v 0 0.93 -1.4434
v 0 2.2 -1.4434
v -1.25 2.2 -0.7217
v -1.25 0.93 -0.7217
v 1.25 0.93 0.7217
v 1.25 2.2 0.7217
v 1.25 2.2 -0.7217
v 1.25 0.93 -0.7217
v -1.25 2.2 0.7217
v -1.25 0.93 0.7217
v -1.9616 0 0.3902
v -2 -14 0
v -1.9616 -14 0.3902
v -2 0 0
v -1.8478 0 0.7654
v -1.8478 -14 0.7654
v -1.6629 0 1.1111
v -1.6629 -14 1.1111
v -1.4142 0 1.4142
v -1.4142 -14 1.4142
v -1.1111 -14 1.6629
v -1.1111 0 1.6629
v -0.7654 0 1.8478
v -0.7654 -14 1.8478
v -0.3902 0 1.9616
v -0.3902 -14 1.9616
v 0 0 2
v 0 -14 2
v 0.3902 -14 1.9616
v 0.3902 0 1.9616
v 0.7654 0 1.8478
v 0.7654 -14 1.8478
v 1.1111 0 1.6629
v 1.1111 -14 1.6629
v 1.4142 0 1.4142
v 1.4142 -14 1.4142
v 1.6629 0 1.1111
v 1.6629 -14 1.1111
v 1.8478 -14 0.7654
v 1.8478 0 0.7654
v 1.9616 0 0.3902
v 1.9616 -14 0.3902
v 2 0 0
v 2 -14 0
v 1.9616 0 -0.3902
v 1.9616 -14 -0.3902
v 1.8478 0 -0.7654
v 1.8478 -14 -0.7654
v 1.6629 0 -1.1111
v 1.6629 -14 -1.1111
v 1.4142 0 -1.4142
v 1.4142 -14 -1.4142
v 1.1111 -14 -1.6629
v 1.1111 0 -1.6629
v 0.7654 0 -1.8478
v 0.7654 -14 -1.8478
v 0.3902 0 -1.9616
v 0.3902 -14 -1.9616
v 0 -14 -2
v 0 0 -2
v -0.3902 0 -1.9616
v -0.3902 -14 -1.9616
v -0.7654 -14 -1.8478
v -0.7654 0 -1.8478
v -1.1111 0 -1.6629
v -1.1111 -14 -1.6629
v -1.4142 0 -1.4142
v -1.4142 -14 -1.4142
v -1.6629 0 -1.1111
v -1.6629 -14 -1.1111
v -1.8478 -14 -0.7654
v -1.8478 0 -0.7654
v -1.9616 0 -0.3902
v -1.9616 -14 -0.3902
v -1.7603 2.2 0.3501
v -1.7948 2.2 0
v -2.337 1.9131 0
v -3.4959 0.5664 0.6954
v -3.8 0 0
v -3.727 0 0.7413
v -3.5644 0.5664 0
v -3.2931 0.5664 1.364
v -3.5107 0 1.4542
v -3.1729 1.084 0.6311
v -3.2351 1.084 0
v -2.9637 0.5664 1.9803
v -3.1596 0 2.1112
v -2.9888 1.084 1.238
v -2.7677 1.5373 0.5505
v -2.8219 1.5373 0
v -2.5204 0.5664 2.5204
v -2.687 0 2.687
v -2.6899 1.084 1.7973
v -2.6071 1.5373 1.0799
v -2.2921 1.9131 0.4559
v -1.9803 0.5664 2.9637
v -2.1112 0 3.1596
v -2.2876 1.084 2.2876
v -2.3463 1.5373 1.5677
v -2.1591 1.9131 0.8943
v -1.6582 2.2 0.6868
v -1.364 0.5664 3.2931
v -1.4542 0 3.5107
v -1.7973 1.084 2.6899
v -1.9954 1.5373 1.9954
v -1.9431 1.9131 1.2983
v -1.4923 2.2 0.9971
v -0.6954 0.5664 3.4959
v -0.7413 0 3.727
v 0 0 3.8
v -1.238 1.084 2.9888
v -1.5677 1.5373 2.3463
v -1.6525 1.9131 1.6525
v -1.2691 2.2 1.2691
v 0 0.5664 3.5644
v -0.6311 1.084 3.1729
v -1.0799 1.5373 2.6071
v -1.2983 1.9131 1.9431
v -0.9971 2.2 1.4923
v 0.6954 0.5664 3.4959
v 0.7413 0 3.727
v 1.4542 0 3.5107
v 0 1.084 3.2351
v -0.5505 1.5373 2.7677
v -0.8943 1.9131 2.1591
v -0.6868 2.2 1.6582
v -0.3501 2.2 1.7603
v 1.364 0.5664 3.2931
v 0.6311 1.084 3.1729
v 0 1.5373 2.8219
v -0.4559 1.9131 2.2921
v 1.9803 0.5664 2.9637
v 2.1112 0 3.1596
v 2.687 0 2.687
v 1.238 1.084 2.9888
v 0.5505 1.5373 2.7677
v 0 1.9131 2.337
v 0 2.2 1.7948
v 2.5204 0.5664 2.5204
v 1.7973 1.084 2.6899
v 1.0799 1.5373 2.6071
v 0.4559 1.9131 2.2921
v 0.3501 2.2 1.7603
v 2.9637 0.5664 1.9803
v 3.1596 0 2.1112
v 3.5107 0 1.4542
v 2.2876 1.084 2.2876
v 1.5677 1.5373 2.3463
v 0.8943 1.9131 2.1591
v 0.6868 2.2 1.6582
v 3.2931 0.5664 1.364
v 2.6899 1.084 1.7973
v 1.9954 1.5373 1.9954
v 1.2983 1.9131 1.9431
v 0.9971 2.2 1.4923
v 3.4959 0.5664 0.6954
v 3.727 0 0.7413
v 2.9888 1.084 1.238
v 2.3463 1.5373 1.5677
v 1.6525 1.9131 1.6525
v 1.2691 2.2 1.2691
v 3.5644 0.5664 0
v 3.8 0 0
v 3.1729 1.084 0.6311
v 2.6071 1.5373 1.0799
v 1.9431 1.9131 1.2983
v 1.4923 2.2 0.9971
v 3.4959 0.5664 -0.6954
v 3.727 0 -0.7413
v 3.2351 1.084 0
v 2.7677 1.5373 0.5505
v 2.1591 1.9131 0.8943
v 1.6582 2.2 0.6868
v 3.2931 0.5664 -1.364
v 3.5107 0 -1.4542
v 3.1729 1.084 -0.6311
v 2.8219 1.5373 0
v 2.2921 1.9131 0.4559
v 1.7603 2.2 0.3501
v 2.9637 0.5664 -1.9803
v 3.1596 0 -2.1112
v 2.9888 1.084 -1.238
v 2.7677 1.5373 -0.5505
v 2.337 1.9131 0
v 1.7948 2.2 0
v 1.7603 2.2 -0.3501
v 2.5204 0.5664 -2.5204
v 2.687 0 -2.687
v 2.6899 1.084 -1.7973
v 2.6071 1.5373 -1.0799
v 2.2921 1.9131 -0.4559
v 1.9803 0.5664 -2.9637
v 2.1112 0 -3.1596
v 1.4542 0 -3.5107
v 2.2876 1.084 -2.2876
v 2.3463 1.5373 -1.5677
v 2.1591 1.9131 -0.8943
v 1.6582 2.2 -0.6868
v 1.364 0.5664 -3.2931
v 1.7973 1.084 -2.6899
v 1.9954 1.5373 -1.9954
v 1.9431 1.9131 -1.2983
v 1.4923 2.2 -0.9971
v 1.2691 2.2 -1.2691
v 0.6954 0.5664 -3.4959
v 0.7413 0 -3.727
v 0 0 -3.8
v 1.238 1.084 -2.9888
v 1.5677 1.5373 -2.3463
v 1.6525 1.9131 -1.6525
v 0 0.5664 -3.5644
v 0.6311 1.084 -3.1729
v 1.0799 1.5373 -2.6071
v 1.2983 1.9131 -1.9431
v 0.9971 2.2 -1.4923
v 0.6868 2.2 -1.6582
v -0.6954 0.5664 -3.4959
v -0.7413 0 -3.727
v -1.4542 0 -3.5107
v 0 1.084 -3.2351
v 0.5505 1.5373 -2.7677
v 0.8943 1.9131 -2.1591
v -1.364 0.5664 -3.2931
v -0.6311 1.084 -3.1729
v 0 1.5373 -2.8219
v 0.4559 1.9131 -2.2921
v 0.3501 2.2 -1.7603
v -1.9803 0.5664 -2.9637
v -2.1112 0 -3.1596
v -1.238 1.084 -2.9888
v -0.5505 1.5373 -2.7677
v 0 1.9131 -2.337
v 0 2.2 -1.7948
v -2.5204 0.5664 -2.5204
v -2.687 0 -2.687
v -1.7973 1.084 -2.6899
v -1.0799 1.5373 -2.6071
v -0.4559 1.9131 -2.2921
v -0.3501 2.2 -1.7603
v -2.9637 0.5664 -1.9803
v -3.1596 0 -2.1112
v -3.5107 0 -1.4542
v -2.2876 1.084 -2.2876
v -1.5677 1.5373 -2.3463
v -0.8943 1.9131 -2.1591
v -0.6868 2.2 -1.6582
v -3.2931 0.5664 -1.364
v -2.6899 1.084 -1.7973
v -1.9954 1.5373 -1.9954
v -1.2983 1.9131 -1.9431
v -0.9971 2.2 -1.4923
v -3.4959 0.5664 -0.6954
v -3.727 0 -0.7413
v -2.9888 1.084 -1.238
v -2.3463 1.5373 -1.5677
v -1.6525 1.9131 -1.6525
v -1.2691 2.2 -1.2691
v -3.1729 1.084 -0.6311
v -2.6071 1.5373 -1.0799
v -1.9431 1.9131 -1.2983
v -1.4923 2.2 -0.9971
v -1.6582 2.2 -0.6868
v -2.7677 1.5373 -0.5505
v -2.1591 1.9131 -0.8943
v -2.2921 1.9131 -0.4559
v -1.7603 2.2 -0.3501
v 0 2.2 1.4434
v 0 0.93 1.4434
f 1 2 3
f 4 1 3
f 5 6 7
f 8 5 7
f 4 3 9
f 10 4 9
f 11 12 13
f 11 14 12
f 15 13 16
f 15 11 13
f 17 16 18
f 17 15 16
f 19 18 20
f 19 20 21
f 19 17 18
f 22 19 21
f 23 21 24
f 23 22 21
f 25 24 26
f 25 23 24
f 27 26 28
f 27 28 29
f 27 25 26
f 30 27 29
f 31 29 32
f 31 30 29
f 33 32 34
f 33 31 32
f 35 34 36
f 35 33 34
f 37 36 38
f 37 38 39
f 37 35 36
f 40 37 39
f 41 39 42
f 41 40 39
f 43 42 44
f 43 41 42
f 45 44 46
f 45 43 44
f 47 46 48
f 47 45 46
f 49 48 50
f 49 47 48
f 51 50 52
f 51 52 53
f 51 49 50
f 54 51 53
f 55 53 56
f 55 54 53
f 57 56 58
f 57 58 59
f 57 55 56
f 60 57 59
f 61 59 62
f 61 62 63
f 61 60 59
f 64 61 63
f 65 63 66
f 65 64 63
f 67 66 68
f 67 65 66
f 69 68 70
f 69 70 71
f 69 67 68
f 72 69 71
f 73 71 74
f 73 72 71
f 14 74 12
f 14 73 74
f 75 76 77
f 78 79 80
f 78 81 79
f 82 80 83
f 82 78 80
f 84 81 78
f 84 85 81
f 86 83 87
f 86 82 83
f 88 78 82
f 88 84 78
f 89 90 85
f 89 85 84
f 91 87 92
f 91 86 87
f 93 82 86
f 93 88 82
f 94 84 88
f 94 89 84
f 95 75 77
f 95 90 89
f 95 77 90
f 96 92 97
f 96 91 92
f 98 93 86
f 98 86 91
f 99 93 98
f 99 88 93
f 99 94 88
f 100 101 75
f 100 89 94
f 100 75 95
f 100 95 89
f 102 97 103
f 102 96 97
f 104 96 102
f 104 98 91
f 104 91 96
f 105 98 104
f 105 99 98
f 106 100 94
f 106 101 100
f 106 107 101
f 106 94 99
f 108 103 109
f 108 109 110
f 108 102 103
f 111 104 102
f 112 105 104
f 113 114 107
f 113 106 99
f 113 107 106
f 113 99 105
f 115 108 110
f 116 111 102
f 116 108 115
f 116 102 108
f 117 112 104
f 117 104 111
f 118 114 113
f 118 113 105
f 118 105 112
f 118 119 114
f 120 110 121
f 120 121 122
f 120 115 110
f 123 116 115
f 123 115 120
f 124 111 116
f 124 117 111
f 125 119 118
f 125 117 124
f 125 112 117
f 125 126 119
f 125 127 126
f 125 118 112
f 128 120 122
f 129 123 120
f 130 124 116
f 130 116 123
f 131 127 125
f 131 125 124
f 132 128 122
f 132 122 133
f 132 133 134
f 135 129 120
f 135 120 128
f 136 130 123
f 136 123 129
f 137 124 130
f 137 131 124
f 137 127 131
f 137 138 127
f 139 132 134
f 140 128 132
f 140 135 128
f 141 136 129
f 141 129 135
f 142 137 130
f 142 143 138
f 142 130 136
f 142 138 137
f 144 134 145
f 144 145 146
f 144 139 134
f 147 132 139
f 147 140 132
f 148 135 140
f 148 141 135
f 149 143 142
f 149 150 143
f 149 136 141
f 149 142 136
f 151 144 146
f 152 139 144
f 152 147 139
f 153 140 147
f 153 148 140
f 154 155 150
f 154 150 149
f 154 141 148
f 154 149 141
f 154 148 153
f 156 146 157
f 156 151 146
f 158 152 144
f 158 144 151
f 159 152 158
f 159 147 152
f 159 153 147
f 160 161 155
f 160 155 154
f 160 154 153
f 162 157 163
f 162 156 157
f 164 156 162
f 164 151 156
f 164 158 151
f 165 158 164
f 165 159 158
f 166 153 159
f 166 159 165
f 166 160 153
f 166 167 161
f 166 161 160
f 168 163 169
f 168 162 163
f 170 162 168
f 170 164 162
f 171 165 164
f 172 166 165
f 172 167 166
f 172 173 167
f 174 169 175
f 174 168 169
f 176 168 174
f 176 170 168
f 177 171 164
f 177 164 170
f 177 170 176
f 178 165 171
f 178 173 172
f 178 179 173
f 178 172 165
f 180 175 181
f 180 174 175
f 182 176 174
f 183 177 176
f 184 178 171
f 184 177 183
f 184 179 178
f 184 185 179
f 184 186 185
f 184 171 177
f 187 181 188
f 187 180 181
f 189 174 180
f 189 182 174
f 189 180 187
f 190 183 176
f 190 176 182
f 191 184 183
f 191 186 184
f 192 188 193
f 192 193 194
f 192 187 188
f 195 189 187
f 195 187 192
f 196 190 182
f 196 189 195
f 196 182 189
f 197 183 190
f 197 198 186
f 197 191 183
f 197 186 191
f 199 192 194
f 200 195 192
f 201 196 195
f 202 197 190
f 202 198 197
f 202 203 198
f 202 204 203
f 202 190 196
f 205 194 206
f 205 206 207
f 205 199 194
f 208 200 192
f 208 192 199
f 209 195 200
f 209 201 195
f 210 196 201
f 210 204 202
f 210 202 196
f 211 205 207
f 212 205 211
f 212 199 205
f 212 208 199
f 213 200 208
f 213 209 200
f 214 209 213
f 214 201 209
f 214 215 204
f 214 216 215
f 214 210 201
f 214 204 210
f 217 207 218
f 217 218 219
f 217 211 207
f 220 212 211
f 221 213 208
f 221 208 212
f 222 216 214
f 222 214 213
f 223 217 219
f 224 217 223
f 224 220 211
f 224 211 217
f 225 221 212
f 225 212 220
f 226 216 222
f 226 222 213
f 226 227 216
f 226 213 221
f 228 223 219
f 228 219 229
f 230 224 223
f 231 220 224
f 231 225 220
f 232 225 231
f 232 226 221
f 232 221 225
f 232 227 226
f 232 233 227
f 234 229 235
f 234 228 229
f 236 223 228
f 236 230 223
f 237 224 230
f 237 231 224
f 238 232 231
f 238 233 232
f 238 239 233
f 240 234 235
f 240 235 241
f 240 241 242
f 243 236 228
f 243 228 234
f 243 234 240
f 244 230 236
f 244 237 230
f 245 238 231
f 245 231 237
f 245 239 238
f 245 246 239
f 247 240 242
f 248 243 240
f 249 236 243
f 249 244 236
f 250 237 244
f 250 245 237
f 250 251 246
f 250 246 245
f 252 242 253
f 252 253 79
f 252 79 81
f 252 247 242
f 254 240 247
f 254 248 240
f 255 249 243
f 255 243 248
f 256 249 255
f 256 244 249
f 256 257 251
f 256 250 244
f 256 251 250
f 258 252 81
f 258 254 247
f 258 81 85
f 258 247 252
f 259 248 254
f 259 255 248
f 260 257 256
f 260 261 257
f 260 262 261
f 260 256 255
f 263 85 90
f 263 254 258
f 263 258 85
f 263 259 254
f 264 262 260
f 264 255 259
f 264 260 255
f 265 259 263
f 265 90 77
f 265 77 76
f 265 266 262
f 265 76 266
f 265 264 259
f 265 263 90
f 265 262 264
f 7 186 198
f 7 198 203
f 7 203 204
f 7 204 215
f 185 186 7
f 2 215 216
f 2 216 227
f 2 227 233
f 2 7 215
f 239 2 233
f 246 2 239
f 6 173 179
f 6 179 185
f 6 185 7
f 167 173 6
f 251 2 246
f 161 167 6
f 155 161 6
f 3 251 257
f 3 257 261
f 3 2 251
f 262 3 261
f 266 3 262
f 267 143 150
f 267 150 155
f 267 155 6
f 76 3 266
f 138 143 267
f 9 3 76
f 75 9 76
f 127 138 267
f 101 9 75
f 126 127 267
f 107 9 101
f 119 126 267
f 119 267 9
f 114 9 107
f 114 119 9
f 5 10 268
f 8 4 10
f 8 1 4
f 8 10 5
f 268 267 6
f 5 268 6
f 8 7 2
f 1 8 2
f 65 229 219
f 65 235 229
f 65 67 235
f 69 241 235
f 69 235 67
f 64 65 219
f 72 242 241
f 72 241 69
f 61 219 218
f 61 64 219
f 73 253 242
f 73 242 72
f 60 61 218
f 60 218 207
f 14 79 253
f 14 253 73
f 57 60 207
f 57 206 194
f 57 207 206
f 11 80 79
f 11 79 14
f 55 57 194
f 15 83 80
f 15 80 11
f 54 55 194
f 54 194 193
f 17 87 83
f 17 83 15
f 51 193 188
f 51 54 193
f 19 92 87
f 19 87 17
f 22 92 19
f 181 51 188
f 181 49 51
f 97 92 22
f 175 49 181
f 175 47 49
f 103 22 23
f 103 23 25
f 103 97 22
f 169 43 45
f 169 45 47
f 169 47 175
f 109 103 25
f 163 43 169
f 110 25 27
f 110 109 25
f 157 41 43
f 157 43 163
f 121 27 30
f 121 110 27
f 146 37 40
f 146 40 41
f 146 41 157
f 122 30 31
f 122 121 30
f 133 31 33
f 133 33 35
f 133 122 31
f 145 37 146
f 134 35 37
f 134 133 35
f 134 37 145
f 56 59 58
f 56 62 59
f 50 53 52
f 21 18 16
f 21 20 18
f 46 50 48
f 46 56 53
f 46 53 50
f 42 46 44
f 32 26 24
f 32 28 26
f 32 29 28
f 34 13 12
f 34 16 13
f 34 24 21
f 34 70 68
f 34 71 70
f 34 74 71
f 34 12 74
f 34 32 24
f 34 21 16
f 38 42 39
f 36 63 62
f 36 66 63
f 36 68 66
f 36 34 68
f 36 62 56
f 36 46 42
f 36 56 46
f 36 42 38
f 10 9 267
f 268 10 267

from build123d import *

# Parameters (mm, degrees)
CUT_EXTRUDE1_DEPTH = 1.27


with BuildPart() as part:
    # Sketch1 → Revolve1 (revolve)
    with BuildSketch(Plane.XY):
        with BuildLine():
            Line((-2, 0), (-3.8, 0))
            ThreePointArc((-3.8, 0), (-3.038270032, 1.319559026), (-1.79477003, 2.2))
            Line((-1.79477003, 2.2), (0, 2.2))
            Line((0, 2.2), (0, -14))
            Line((0, -14), (-2, -14))
            Line((-2, -14), (-2, 0))
        make_face()
    revolve(axis=Axis((0, -14, 0), (0, 1, 0)))

    # Sketch2 → Cut-Extrude1 (cut)
    with BuildSketch(Plane(origin=(0, 2.2, 0), x_dir=(1, 0, 0), z_dir=(0, 1, 0))):
        Polygon((-1.25, 0.721687836), (-1.25, -0.721687836), (0, -1.443375673), (1.25, -0.721687836), (1.25, 0.721687836), (0, 1.443375673), align=None)
    extrude(amount=-CUT_EXTRUDE1_DEPTH, mode=Mode.SUBTRACT)


solid = part.part
